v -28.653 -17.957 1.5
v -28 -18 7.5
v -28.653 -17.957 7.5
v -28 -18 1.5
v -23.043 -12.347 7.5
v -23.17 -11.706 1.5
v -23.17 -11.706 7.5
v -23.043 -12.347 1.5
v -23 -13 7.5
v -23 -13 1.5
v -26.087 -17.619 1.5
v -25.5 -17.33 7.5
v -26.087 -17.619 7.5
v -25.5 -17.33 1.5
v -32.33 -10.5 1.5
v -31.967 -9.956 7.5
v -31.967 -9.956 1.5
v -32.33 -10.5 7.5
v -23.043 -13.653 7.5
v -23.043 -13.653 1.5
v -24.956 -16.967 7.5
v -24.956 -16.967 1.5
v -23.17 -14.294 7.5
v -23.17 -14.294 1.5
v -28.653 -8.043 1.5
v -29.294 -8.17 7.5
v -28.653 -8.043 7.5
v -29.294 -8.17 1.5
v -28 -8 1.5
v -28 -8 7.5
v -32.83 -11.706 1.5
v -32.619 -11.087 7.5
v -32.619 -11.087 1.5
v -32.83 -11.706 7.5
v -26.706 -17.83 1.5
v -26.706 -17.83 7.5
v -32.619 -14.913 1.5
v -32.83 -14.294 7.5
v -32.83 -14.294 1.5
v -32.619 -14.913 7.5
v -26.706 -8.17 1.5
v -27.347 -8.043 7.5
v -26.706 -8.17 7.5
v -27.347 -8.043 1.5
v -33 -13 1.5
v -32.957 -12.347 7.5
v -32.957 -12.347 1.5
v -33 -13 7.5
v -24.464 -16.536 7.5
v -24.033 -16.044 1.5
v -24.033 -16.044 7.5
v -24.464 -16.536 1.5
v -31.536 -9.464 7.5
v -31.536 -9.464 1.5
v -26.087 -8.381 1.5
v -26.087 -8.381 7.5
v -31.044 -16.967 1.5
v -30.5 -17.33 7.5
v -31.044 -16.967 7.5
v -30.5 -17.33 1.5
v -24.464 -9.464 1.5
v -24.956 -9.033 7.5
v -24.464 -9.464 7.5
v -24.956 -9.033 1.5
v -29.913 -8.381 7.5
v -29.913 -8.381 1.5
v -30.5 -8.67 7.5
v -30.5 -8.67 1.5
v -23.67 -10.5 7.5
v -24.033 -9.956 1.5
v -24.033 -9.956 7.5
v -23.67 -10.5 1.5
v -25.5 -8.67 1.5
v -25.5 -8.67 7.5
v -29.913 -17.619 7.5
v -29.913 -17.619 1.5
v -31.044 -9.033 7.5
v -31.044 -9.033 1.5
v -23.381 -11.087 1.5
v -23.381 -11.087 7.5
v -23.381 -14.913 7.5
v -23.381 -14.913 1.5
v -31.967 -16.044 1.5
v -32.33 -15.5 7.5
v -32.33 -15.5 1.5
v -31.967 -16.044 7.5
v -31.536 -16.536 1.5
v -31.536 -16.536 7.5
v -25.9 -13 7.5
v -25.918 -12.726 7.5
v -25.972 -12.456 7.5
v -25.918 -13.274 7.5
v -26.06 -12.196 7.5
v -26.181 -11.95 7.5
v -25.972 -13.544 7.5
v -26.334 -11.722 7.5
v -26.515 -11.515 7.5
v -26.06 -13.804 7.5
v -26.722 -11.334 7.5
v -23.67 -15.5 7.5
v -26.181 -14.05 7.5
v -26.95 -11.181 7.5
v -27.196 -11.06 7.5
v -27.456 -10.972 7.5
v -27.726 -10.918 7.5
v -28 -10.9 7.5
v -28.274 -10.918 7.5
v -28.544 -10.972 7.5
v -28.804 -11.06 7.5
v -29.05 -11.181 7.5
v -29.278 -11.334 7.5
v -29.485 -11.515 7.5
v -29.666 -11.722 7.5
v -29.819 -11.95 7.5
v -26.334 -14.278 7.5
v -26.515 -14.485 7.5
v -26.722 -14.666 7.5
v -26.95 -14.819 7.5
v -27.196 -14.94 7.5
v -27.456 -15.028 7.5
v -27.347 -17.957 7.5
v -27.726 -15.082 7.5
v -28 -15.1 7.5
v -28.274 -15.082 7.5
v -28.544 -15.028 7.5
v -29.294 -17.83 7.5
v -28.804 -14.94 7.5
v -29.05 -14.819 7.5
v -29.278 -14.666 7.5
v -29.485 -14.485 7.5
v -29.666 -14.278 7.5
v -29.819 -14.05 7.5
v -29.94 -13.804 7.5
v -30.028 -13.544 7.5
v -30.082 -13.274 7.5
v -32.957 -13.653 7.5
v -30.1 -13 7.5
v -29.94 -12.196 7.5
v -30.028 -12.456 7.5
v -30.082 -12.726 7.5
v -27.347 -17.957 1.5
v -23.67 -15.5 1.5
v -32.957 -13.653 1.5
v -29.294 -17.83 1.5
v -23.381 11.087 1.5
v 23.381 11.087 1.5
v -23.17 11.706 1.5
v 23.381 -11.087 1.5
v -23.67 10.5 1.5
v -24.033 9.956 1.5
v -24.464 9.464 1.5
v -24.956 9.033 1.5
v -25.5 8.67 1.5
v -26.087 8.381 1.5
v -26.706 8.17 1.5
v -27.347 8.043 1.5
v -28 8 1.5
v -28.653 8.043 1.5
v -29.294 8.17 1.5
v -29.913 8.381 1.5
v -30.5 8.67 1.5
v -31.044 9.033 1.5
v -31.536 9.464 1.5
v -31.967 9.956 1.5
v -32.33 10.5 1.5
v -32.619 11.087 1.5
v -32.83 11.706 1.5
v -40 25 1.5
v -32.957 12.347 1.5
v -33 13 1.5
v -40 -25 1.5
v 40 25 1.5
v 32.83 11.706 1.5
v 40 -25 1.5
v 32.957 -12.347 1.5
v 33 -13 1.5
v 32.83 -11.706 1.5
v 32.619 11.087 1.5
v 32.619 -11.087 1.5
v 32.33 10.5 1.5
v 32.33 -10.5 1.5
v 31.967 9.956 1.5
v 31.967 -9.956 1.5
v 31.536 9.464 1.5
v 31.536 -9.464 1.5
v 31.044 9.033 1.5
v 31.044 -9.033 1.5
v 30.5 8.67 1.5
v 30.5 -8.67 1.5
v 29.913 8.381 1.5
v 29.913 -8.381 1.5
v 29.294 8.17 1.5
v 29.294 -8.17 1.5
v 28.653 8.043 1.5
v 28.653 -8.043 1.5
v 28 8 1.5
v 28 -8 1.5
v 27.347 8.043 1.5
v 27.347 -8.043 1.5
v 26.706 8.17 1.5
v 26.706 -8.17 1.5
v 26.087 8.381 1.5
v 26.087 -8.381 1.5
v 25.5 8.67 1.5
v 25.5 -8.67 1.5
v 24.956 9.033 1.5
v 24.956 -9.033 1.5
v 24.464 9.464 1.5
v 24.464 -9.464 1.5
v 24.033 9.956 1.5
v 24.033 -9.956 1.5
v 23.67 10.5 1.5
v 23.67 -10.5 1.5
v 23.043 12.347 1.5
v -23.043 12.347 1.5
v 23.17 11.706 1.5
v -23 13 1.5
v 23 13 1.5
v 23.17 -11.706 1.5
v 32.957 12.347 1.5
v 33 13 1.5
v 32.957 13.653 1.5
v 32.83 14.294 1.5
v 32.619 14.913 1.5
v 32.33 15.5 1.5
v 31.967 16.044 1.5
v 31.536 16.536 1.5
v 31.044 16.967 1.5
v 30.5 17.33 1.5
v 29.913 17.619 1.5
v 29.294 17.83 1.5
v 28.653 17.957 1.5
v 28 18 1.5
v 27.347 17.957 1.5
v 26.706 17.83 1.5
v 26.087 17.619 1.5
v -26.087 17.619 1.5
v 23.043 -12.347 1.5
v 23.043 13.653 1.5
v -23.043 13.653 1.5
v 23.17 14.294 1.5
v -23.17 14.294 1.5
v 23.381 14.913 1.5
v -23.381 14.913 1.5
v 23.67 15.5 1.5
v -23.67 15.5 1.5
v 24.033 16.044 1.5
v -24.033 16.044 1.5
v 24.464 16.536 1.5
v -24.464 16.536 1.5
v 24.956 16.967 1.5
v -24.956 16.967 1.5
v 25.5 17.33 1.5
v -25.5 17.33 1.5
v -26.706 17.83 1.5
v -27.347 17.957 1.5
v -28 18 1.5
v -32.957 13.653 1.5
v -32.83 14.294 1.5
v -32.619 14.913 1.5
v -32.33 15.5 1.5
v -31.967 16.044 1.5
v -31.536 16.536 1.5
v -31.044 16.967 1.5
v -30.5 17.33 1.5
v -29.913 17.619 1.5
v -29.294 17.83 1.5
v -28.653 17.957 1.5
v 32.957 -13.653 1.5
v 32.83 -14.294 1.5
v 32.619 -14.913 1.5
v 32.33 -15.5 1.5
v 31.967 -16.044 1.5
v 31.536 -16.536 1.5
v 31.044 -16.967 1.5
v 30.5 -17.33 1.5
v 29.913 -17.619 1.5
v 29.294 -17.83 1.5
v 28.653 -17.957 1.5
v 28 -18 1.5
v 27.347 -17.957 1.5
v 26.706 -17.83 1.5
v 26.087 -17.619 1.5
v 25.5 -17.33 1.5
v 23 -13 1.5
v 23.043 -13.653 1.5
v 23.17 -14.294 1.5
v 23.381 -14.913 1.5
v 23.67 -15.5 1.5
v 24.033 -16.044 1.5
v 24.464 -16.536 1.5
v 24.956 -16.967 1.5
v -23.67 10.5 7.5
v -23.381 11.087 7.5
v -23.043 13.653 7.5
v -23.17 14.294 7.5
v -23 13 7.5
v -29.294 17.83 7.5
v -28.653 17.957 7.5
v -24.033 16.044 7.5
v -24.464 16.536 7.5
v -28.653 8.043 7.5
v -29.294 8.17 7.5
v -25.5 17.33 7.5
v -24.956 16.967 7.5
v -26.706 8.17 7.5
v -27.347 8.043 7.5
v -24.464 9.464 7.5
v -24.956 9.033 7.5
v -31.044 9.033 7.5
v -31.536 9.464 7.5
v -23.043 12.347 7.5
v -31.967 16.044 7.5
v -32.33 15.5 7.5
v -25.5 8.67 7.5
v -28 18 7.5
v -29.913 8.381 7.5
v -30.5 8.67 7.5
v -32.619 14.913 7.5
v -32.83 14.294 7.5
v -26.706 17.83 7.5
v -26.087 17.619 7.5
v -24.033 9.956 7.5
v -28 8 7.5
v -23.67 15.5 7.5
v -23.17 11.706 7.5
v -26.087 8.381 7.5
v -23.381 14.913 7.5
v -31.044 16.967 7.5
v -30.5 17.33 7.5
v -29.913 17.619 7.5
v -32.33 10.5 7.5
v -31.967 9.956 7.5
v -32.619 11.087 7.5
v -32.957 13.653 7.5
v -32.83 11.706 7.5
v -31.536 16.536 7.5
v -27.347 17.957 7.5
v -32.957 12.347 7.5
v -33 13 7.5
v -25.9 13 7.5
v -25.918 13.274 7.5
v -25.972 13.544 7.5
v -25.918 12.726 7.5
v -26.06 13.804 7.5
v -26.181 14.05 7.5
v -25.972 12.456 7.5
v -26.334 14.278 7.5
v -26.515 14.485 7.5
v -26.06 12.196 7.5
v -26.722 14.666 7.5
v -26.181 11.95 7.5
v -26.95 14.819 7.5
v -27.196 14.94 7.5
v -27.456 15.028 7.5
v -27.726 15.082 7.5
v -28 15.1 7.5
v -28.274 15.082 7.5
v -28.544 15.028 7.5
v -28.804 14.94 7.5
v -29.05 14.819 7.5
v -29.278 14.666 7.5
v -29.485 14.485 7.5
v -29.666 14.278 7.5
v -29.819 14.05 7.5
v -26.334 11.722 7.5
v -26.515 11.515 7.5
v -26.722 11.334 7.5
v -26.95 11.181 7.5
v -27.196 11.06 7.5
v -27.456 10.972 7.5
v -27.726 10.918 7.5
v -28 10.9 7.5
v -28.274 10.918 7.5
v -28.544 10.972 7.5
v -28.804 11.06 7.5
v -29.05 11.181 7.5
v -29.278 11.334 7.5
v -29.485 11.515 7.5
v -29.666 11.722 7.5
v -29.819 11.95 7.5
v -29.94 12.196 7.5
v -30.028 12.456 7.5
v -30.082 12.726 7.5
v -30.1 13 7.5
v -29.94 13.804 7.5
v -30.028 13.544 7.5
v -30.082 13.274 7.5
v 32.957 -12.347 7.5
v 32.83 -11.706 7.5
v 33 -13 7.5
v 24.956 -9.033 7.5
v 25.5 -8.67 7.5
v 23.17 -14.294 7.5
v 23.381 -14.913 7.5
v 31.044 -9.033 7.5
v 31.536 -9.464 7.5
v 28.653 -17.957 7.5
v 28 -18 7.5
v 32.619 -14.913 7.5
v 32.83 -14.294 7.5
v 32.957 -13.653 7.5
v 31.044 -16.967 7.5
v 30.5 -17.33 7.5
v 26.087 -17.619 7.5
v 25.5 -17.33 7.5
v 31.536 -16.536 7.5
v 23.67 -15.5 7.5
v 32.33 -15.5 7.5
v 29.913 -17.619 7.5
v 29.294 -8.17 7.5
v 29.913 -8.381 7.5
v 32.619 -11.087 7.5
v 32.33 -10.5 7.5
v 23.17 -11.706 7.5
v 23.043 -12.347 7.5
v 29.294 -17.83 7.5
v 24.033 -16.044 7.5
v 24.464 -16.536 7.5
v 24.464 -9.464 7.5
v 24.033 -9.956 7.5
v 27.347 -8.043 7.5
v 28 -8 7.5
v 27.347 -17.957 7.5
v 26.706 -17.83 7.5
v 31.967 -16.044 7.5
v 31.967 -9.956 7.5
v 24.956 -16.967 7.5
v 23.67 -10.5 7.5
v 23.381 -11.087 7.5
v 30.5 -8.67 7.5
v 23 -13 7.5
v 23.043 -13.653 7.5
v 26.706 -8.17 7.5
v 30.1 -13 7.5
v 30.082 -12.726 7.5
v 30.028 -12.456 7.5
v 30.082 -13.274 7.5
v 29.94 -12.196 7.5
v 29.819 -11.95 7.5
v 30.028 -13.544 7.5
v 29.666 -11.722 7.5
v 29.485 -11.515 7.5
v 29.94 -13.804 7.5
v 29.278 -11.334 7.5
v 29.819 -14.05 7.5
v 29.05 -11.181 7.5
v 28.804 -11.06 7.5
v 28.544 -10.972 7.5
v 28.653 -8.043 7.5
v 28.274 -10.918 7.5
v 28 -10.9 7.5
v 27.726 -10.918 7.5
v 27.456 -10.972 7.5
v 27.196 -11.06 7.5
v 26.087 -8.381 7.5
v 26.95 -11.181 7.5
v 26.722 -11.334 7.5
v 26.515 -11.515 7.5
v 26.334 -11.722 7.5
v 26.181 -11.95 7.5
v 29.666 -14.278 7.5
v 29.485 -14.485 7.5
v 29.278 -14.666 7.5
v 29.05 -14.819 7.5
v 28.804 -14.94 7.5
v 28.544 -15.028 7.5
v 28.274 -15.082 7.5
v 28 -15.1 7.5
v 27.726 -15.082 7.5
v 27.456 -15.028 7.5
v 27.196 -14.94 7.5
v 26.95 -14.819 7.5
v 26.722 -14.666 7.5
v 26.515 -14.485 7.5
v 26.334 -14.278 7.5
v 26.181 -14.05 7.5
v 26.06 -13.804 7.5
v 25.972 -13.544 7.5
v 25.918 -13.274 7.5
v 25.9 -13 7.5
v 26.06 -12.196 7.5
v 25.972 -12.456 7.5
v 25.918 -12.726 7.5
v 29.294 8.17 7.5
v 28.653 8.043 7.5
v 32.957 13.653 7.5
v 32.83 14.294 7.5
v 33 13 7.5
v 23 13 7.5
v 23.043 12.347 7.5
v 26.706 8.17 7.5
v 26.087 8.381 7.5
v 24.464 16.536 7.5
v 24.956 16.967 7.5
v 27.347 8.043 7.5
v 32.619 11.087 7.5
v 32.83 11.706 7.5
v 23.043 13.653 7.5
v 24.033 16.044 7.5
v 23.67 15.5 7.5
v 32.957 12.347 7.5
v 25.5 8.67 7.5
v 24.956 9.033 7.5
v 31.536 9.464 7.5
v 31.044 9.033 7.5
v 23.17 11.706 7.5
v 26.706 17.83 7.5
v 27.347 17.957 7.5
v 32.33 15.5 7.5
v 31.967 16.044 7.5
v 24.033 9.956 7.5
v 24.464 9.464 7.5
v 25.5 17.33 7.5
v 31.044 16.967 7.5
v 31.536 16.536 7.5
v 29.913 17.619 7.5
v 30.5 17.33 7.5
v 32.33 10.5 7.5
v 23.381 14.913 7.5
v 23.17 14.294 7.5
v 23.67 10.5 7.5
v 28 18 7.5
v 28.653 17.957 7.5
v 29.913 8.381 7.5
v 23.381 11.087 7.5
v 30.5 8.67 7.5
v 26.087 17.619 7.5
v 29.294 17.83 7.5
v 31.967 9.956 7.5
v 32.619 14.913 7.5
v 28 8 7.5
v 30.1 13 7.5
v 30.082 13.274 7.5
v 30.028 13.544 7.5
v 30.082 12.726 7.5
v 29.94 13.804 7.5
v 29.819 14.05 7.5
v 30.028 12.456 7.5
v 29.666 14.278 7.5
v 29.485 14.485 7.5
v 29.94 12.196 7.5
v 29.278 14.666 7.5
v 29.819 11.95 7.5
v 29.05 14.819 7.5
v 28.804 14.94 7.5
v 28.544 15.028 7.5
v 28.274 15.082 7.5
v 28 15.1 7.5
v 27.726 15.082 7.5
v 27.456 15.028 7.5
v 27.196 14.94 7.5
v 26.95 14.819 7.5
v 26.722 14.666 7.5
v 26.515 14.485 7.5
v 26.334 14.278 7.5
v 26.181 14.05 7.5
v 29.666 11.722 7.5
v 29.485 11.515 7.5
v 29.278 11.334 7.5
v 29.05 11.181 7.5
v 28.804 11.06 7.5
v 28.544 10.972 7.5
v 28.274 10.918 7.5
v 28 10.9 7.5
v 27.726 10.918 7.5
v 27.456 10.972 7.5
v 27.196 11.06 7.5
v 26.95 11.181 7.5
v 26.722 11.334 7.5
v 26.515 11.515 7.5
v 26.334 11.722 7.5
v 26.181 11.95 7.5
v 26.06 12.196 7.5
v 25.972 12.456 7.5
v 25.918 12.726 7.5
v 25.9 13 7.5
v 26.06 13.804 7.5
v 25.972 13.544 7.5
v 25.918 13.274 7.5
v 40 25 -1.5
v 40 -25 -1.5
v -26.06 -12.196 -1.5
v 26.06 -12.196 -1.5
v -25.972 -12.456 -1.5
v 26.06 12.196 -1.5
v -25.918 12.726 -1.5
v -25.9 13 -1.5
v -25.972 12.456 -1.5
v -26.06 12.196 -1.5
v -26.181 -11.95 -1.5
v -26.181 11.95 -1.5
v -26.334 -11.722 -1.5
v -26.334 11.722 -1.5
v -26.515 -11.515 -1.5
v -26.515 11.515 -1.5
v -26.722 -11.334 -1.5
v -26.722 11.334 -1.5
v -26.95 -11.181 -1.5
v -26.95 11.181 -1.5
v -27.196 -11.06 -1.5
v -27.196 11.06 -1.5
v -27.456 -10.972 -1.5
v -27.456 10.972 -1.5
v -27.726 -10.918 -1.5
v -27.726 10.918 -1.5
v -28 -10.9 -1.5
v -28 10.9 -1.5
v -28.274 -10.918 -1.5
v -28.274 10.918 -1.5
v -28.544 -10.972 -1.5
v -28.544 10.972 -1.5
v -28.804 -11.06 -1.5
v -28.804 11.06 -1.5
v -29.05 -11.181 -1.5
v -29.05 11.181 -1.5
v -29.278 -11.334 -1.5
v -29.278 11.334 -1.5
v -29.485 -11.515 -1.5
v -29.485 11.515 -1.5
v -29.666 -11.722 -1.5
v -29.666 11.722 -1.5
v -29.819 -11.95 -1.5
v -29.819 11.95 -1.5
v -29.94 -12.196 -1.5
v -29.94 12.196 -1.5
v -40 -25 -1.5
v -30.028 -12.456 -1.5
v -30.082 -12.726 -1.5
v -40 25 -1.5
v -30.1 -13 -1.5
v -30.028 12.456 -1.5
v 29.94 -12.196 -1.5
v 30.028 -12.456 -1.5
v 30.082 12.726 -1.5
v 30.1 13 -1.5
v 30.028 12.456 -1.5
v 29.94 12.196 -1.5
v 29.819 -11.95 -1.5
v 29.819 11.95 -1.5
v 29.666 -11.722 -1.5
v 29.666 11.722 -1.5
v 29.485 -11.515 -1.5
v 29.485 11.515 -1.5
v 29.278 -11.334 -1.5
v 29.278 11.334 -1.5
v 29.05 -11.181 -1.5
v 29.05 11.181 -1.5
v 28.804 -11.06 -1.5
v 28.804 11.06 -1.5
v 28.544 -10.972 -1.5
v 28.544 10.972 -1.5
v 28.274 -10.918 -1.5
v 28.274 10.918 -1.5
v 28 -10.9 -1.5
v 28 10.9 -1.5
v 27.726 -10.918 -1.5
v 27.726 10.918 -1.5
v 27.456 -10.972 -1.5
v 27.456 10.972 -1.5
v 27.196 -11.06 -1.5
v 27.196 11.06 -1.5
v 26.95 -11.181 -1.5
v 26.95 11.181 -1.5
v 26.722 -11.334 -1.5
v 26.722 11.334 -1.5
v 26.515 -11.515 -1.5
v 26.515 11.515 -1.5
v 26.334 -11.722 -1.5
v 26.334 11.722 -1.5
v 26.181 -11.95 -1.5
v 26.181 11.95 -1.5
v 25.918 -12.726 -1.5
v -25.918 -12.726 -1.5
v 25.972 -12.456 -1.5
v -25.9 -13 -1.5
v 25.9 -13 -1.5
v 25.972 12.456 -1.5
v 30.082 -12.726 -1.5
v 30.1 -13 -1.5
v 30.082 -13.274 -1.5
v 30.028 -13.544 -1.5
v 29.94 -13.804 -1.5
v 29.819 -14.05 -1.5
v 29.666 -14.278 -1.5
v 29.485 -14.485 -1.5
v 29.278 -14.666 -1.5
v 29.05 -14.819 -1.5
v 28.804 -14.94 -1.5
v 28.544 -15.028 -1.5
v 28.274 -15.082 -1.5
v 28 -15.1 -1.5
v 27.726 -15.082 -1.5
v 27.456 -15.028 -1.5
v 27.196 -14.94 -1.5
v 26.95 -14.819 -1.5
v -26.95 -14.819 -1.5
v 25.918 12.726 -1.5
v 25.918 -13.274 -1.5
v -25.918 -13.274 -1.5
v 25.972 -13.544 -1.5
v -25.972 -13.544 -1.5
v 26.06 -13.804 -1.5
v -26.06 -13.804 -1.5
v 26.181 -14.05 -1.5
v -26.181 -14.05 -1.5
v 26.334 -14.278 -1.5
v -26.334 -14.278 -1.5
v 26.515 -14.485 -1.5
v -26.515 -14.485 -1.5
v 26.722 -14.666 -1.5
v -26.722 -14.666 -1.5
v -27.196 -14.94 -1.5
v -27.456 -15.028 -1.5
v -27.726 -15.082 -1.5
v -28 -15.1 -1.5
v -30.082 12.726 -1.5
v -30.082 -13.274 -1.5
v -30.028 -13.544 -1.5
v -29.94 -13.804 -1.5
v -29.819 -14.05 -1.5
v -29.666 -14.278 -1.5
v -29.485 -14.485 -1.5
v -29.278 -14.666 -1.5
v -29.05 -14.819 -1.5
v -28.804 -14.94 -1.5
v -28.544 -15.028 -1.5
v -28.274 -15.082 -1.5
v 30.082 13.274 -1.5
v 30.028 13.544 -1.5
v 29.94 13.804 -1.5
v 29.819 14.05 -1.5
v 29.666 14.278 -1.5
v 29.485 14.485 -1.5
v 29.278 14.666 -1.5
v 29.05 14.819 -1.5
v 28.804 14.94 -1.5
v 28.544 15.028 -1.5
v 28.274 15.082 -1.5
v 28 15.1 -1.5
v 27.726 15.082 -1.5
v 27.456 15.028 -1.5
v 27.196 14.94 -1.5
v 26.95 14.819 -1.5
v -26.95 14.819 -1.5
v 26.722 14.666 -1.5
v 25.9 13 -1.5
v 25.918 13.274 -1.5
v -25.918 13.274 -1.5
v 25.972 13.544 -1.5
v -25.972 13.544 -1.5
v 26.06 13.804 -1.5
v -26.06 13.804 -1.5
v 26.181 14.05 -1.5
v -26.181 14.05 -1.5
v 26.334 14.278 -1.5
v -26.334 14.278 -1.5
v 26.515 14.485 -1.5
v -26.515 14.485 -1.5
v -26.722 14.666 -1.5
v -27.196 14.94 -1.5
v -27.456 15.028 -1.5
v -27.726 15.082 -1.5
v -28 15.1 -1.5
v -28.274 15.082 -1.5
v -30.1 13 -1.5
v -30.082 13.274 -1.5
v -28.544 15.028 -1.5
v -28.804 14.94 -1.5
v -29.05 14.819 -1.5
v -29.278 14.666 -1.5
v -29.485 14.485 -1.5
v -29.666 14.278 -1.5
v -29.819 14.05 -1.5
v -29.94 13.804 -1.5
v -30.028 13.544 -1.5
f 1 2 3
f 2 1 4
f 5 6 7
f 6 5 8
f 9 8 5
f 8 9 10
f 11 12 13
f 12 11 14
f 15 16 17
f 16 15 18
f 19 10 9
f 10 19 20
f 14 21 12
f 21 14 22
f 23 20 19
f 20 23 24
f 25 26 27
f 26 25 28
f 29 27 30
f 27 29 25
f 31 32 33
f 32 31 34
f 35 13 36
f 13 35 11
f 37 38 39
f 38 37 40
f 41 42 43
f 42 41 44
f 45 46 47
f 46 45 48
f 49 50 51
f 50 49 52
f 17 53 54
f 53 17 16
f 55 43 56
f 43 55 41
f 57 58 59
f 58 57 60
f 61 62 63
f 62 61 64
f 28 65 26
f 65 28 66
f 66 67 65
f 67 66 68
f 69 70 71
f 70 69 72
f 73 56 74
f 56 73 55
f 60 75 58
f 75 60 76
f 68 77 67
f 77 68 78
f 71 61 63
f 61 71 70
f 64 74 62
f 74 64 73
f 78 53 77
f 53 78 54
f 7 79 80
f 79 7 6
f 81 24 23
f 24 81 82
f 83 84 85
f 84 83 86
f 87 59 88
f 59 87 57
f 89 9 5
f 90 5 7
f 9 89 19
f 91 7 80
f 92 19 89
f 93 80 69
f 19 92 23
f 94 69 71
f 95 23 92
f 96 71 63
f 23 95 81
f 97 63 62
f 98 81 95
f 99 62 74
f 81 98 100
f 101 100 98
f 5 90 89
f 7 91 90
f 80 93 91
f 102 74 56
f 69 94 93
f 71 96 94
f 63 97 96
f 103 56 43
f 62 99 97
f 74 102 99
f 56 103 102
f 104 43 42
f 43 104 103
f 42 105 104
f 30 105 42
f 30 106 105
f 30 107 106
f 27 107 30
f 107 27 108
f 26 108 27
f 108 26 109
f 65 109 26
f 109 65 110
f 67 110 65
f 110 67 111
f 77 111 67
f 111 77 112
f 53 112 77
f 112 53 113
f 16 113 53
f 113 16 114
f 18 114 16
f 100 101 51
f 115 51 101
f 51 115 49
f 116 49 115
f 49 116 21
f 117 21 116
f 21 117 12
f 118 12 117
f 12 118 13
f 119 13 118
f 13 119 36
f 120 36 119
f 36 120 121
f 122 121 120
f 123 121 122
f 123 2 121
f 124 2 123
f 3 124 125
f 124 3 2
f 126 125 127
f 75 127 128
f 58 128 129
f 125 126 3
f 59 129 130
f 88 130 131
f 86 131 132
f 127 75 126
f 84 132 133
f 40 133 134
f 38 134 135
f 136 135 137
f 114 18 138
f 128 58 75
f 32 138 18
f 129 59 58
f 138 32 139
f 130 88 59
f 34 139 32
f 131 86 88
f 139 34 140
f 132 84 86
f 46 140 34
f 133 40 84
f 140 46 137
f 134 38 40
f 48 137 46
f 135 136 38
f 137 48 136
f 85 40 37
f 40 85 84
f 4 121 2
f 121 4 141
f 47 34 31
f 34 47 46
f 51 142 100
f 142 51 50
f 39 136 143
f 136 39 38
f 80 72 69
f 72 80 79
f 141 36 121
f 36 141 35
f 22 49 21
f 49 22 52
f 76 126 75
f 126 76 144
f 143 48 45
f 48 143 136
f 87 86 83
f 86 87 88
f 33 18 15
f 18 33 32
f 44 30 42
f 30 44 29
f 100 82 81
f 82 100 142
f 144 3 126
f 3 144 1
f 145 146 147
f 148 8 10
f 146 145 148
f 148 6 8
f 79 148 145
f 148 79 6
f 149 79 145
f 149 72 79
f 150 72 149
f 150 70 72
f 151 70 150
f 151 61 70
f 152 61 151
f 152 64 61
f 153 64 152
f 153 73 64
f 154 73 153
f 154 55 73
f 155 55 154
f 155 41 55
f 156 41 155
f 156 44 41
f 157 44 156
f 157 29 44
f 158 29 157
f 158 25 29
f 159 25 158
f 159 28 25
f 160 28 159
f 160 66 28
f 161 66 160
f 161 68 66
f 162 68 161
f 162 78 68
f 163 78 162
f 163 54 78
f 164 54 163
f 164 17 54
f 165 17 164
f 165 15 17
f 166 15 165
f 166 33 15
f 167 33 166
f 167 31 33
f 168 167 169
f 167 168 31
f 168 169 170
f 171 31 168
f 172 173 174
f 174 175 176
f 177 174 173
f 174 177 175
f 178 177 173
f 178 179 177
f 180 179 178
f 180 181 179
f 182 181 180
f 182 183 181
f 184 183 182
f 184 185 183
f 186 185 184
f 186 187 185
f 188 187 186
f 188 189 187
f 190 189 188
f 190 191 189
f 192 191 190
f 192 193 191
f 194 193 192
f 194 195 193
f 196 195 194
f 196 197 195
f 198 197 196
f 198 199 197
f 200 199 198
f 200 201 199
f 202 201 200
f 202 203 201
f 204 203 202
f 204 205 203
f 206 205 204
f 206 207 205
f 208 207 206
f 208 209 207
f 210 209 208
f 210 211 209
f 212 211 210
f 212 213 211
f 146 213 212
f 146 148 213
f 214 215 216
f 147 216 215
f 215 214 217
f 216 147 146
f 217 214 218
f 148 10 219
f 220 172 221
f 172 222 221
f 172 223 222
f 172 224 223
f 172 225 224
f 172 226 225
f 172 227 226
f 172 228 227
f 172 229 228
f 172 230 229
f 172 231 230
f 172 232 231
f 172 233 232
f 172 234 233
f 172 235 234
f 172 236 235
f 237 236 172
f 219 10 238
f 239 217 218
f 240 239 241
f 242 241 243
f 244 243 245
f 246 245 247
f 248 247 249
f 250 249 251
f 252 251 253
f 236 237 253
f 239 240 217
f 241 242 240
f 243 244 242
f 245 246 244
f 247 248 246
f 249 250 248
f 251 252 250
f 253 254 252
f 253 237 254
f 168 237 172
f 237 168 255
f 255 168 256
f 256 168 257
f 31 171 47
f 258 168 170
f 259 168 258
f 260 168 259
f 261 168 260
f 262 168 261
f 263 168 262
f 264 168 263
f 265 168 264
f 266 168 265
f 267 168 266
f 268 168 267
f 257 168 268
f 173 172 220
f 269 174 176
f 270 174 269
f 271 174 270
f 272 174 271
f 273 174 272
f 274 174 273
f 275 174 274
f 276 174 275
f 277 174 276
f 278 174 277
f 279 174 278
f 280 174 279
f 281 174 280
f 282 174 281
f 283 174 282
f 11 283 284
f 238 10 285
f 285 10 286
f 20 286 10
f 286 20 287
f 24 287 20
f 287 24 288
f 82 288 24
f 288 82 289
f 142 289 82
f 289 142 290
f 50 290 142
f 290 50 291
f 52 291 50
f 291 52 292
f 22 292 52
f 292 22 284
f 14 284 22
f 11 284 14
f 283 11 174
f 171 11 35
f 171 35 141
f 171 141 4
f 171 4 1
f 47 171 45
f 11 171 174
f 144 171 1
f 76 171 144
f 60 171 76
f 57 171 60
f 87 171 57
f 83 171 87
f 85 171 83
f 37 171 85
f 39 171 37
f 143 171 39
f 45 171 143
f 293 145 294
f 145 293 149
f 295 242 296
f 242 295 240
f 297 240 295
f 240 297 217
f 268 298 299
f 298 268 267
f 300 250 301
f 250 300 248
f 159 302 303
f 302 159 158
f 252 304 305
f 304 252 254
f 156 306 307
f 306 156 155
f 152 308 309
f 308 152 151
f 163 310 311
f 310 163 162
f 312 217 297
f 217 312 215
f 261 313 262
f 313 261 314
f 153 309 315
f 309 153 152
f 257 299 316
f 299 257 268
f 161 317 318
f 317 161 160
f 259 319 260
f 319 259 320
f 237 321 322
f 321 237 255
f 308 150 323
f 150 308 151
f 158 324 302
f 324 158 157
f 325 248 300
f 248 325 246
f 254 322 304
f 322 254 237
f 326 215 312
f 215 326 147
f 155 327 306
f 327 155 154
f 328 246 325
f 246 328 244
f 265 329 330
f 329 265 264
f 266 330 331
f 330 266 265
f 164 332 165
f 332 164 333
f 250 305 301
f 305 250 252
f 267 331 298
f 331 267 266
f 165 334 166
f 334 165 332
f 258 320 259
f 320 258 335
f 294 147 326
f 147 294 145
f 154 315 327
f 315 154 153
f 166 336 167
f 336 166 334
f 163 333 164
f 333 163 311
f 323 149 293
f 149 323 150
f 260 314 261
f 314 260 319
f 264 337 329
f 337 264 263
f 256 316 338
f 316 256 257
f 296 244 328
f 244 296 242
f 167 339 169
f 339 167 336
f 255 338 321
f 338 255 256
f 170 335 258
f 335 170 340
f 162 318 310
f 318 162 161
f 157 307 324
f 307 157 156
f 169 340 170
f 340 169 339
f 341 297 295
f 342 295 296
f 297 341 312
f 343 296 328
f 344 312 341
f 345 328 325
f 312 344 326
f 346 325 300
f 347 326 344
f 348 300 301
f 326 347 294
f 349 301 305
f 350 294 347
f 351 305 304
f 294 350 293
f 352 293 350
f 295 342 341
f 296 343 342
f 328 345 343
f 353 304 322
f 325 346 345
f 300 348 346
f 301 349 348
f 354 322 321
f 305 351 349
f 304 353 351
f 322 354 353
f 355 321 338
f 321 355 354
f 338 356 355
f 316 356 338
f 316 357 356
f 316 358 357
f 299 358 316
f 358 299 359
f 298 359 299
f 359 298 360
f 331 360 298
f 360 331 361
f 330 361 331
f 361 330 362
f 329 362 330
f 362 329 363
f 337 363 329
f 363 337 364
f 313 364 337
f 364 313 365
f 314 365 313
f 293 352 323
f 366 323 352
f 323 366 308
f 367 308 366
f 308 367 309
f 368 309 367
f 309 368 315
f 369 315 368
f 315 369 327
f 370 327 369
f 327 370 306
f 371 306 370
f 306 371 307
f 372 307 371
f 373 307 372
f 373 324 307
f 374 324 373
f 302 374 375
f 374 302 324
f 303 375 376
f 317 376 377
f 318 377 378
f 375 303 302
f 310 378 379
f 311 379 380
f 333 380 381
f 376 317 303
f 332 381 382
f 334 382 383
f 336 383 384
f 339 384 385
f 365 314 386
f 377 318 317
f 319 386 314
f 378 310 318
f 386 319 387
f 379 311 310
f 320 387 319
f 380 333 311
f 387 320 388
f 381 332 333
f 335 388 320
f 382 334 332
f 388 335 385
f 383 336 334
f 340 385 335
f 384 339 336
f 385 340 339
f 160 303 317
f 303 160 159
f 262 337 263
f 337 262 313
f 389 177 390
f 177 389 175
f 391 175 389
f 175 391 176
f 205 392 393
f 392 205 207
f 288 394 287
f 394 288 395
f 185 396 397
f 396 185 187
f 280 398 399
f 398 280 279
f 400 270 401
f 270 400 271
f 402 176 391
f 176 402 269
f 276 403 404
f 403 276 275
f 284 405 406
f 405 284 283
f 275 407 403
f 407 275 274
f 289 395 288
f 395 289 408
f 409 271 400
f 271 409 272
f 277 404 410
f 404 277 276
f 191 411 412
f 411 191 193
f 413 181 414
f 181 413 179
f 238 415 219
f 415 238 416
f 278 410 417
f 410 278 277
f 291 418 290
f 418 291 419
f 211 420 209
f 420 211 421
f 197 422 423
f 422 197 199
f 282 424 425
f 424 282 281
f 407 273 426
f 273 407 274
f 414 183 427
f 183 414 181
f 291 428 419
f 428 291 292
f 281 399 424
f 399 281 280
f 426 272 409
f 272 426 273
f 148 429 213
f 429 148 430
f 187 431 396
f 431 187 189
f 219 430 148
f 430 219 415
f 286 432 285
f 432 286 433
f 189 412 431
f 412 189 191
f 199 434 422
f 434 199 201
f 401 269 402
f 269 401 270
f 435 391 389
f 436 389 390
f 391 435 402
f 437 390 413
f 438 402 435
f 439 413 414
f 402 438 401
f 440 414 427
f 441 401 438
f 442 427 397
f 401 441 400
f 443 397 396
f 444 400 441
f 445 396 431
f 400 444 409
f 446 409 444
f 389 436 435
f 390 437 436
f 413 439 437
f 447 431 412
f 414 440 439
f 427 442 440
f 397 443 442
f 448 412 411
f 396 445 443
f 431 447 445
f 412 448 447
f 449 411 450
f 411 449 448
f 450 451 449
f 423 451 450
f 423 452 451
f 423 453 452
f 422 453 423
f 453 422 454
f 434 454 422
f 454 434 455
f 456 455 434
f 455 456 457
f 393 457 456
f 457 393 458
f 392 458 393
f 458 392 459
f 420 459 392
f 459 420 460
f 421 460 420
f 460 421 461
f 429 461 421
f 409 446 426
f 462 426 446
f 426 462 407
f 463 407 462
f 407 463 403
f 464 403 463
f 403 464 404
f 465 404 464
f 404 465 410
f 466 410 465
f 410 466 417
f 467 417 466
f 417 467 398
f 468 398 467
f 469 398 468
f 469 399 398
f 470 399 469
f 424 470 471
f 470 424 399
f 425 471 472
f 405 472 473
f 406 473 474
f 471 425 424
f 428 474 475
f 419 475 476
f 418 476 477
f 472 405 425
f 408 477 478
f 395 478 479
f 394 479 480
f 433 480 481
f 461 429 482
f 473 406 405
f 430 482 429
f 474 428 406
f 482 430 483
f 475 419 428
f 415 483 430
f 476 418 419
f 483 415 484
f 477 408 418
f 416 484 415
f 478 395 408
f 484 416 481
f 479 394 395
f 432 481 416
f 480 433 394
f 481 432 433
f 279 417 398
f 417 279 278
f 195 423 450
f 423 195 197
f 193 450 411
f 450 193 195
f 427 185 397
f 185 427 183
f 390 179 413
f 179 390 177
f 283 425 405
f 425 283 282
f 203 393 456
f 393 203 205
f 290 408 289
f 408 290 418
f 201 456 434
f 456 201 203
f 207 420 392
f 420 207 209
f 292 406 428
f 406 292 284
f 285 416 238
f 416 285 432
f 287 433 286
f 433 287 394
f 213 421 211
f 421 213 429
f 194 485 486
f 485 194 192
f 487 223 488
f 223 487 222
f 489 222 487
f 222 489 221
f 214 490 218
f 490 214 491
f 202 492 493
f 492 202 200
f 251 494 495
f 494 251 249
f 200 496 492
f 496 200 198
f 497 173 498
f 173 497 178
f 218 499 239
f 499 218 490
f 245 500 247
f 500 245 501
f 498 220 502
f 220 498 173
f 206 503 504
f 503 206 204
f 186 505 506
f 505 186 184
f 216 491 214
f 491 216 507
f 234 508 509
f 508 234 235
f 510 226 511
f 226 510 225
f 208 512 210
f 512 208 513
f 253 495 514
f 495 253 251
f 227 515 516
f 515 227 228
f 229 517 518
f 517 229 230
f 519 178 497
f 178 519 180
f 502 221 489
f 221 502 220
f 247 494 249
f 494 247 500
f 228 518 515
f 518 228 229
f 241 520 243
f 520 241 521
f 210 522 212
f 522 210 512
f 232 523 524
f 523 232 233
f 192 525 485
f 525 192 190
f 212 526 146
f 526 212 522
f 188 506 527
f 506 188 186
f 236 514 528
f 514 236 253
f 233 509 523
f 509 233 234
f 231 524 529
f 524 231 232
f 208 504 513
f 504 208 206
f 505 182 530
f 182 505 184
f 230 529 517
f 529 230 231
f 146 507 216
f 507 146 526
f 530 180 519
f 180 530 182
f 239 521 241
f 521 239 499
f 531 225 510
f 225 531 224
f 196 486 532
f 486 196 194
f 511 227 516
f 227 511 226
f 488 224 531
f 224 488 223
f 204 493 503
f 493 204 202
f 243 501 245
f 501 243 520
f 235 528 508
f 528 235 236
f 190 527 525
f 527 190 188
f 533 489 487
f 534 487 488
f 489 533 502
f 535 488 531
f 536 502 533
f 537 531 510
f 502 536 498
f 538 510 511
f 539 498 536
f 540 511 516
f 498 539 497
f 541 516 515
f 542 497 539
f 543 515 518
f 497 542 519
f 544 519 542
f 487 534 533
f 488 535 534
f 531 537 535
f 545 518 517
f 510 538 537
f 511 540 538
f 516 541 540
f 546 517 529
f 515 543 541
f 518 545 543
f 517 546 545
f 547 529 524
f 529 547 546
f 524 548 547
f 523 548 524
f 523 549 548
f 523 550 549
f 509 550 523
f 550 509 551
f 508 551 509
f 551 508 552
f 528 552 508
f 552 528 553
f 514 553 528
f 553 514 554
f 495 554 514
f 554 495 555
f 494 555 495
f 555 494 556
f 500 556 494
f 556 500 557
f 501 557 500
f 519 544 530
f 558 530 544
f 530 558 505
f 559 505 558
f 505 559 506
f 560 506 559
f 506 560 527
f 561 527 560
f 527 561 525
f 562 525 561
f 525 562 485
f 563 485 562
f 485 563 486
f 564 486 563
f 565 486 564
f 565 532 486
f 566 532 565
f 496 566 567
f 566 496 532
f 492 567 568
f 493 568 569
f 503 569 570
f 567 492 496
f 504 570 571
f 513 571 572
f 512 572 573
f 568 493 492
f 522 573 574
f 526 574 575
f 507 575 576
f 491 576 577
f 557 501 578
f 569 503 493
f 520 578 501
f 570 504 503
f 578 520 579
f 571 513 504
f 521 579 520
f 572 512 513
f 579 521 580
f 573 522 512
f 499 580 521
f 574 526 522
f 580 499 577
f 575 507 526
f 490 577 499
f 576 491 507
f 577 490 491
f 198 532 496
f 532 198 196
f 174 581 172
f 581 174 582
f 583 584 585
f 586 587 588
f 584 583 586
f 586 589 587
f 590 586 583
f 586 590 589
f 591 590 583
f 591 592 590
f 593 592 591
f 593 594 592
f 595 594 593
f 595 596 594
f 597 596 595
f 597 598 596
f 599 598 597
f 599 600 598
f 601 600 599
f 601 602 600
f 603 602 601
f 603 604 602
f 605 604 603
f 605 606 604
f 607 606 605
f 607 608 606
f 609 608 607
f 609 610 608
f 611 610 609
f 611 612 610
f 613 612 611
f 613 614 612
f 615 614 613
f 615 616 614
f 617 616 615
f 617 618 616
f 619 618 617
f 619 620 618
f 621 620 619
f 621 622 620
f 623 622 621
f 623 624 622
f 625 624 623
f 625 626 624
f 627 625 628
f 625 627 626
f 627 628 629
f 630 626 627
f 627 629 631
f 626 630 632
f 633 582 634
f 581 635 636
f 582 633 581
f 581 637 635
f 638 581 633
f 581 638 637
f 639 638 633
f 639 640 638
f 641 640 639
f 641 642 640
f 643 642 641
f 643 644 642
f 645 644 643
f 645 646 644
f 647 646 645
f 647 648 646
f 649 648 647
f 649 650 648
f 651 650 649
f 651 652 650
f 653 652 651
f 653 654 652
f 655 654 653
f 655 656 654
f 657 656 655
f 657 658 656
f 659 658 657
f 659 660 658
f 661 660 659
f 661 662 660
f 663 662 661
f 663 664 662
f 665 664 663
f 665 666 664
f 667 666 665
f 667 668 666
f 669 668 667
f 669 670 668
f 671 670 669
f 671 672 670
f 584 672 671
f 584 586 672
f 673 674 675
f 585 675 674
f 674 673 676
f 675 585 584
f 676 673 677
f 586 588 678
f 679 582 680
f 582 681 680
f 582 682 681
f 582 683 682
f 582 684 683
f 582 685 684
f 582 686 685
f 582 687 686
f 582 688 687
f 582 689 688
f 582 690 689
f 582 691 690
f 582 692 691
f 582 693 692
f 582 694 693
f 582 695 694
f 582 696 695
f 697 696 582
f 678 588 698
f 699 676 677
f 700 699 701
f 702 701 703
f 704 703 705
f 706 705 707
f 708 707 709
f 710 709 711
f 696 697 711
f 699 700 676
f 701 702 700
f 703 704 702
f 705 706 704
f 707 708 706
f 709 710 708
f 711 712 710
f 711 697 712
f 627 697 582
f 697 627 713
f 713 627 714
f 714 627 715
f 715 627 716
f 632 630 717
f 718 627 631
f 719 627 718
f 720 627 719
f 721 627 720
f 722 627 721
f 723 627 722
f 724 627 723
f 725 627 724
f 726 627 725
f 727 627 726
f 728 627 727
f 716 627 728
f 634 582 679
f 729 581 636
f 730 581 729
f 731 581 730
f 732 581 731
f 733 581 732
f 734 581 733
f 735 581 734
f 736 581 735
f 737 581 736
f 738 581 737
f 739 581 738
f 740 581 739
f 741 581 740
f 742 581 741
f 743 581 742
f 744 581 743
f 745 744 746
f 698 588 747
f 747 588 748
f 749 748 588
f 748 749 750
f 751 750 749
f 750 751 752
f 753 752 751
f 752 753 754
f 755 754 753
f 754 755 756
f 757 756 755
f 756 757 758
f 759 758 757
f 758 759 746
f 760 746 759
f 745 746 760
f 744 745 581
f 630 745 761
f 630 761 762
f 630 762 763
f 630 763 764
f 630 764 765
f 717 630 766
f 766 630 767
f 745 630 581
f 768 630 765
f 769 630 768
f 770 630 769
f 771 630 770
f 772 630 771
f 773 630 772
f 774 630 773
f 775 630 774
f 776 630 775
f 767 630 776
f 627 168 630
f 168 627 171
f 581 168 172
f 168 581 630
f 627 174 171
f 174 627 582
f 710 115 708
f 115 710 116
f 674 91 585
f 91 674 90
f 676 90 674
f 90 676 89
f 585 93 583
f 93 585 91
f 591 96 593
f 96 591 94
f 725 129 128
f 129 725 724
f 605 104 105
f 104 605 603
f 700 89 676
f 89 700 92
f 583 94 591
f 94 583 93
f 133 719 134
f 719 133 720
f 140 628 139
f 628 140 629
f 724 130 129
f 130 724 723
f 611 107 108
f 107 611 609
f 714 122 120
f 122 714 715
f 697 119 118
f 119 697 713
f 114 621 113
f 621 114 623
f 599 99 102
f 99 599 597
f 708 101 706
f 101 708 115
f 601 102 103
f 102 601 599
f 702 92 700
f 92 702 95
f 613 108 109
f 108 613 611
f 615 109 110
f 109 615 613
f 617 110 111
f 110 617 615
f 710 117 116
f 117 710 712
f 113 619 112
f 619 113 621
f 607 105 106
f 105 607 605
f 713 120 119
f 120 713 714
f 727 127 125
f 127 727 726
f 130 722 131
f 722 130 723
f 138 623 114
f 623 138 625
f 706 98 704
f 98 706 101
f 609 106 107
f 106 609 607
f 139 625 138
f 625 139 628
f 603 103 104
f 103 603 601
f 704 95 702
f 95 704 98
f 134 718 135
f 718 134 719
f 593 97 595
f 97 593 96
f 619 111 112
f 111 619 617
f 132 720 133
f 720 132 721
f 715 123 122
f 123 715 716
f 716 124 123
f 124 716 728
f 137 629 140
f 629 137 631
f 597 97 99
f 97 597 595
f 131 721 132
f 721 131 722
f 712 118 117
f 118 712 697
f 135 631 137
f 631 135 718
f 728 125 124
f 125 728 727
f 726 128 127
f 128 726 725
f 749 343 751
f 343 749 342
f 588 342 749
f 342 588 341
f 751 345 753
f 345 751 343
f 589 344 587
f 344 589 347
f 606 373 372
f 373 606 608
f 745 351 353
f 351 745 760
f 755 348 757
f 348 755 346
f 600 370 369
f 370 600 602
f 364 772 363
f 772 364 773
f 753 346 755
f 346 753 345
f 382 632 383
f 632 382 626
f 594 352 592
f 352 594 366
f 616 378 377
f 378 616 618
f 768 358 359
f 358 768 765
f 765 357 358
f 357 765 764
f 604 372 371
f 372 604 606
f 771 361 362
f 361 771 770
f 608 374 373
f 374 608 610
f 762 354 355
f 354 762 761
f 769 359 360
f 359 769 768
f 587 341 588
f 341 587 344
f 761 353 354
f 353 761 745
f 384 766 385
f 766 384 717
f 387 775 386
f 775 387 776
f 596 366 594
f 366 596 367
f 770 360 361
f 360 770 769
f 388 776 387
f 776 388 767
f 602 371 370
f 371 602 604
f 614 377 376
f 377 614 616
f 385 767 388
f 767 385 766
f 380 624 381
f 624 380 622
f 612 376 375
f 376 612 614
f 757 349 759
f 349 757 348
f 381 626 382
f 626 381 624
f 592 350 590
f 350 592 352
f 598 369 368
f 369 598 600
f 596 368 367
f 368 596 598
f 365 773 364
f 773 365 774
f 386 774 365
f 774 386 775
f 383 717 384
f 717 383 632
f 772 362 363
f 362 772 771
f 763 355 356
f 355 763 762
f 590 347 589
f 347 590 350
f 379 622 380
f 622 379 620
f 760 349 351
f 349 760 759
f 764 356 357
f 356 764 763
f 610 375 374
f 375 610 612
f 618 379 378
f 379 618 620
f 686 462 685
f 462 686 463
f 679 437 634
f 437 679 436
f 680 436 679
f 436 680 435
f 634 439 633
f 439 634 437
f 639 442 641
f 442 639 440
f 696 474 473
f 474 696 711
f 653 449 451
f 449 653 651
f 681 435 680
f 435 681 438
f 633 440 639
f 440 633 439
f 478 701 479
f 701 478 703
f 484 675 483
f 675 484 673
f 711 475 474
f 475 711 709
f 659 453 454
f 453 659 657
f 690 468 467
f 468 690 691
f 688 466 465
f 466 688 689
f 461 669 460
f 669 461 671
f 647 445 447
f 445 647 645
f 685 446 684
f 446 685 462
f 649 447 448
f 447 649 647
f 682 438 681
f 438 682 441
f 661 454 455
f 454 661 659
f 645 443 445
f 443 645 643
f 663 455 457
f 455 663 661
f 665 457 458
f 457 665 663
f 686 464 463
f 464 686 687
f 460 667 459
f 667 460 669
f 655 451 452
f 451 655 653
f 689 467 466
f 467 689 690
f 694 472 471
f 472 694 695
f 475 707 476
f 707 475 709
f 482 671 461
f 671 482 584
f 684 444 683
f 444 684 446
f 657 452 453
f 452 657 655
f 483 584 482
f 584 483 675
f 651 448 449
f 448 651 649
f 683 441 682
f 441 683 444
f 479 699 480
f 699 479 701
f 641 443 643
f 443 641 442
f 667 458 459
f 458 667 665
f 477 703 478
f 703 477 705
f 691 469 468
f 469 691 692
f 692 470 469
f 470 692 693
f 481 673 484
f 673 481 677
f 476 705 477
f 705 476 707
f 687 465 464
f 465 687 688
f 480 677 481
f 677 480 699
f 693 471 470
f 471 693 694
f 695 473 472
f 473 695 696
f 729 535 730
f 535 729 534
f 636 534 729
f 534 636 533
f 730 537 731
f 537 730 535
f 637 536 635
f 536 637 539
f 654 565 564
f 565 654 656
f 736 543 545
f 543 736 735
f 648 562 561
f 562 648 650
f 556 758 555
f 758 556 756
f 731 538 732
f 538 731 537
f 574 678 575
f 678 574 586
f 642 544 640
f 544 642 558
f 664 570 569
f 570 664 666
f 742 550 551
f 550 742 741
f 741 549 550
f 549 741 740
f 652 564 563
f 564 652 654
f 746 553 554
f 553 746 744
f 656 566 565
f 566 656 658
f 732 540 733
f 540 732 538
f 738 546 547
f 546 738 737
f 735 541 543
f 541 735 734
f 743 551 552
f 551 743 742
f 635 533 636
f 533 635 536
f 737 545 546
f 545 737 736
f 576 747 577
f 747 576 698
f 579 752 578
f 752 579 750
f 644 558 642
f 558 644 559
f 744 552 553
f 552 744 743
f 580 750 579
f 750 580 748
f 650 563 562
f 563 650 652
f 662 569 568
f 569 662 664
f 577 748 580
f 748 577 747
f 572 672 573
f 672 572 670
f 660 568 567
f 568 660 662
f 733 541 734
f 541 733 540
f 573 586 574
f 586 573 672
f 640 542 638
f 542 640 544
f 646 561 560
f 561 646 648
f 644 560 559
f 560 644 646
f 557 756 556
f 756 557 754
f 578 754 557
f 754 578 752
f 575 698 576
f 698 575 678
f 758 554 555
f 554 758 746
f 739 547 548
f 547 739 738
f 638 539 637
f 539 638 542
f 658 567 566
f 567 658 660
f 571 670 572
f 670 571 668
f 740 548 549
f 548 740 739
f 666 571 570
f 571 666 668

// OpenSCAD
// Insert Boss Plate
plate_width = 80;
plate_depth = 50;
plate_thickness = 3;
boss_height = 6;
boss_diameter = 10;
insert_diameter = 4.2;
edge_margin = 12;

$fn = 48;

boss_offset_x = plate_width / 2 - edge_margin;
boss_offset_y = plate_depth / 2 - edge_margin;

difference() {
  union() {
    cube([plate_width, plate_depth, plate_thickness], center = true);

    for (sx = [-1, 1], sy = [-1, 1]) {
      translate([sx * boss_offset_x, sy * boss_offset_y, plate_thickness / 2]) {
        cylinder(h = boss_height, d = boss_diameter);
      }
    }
  }

  for (sx = [-1, 1], sy = [-1, 1]) {
    translate([sx * boss_offset_x, sy * boss_offset_y, -plate_thickness / 2 - 0.1]) {
      cylinder(h = plate_thickness + boss_height + 0.2, d = insert_diameter);
    }
  }
}
